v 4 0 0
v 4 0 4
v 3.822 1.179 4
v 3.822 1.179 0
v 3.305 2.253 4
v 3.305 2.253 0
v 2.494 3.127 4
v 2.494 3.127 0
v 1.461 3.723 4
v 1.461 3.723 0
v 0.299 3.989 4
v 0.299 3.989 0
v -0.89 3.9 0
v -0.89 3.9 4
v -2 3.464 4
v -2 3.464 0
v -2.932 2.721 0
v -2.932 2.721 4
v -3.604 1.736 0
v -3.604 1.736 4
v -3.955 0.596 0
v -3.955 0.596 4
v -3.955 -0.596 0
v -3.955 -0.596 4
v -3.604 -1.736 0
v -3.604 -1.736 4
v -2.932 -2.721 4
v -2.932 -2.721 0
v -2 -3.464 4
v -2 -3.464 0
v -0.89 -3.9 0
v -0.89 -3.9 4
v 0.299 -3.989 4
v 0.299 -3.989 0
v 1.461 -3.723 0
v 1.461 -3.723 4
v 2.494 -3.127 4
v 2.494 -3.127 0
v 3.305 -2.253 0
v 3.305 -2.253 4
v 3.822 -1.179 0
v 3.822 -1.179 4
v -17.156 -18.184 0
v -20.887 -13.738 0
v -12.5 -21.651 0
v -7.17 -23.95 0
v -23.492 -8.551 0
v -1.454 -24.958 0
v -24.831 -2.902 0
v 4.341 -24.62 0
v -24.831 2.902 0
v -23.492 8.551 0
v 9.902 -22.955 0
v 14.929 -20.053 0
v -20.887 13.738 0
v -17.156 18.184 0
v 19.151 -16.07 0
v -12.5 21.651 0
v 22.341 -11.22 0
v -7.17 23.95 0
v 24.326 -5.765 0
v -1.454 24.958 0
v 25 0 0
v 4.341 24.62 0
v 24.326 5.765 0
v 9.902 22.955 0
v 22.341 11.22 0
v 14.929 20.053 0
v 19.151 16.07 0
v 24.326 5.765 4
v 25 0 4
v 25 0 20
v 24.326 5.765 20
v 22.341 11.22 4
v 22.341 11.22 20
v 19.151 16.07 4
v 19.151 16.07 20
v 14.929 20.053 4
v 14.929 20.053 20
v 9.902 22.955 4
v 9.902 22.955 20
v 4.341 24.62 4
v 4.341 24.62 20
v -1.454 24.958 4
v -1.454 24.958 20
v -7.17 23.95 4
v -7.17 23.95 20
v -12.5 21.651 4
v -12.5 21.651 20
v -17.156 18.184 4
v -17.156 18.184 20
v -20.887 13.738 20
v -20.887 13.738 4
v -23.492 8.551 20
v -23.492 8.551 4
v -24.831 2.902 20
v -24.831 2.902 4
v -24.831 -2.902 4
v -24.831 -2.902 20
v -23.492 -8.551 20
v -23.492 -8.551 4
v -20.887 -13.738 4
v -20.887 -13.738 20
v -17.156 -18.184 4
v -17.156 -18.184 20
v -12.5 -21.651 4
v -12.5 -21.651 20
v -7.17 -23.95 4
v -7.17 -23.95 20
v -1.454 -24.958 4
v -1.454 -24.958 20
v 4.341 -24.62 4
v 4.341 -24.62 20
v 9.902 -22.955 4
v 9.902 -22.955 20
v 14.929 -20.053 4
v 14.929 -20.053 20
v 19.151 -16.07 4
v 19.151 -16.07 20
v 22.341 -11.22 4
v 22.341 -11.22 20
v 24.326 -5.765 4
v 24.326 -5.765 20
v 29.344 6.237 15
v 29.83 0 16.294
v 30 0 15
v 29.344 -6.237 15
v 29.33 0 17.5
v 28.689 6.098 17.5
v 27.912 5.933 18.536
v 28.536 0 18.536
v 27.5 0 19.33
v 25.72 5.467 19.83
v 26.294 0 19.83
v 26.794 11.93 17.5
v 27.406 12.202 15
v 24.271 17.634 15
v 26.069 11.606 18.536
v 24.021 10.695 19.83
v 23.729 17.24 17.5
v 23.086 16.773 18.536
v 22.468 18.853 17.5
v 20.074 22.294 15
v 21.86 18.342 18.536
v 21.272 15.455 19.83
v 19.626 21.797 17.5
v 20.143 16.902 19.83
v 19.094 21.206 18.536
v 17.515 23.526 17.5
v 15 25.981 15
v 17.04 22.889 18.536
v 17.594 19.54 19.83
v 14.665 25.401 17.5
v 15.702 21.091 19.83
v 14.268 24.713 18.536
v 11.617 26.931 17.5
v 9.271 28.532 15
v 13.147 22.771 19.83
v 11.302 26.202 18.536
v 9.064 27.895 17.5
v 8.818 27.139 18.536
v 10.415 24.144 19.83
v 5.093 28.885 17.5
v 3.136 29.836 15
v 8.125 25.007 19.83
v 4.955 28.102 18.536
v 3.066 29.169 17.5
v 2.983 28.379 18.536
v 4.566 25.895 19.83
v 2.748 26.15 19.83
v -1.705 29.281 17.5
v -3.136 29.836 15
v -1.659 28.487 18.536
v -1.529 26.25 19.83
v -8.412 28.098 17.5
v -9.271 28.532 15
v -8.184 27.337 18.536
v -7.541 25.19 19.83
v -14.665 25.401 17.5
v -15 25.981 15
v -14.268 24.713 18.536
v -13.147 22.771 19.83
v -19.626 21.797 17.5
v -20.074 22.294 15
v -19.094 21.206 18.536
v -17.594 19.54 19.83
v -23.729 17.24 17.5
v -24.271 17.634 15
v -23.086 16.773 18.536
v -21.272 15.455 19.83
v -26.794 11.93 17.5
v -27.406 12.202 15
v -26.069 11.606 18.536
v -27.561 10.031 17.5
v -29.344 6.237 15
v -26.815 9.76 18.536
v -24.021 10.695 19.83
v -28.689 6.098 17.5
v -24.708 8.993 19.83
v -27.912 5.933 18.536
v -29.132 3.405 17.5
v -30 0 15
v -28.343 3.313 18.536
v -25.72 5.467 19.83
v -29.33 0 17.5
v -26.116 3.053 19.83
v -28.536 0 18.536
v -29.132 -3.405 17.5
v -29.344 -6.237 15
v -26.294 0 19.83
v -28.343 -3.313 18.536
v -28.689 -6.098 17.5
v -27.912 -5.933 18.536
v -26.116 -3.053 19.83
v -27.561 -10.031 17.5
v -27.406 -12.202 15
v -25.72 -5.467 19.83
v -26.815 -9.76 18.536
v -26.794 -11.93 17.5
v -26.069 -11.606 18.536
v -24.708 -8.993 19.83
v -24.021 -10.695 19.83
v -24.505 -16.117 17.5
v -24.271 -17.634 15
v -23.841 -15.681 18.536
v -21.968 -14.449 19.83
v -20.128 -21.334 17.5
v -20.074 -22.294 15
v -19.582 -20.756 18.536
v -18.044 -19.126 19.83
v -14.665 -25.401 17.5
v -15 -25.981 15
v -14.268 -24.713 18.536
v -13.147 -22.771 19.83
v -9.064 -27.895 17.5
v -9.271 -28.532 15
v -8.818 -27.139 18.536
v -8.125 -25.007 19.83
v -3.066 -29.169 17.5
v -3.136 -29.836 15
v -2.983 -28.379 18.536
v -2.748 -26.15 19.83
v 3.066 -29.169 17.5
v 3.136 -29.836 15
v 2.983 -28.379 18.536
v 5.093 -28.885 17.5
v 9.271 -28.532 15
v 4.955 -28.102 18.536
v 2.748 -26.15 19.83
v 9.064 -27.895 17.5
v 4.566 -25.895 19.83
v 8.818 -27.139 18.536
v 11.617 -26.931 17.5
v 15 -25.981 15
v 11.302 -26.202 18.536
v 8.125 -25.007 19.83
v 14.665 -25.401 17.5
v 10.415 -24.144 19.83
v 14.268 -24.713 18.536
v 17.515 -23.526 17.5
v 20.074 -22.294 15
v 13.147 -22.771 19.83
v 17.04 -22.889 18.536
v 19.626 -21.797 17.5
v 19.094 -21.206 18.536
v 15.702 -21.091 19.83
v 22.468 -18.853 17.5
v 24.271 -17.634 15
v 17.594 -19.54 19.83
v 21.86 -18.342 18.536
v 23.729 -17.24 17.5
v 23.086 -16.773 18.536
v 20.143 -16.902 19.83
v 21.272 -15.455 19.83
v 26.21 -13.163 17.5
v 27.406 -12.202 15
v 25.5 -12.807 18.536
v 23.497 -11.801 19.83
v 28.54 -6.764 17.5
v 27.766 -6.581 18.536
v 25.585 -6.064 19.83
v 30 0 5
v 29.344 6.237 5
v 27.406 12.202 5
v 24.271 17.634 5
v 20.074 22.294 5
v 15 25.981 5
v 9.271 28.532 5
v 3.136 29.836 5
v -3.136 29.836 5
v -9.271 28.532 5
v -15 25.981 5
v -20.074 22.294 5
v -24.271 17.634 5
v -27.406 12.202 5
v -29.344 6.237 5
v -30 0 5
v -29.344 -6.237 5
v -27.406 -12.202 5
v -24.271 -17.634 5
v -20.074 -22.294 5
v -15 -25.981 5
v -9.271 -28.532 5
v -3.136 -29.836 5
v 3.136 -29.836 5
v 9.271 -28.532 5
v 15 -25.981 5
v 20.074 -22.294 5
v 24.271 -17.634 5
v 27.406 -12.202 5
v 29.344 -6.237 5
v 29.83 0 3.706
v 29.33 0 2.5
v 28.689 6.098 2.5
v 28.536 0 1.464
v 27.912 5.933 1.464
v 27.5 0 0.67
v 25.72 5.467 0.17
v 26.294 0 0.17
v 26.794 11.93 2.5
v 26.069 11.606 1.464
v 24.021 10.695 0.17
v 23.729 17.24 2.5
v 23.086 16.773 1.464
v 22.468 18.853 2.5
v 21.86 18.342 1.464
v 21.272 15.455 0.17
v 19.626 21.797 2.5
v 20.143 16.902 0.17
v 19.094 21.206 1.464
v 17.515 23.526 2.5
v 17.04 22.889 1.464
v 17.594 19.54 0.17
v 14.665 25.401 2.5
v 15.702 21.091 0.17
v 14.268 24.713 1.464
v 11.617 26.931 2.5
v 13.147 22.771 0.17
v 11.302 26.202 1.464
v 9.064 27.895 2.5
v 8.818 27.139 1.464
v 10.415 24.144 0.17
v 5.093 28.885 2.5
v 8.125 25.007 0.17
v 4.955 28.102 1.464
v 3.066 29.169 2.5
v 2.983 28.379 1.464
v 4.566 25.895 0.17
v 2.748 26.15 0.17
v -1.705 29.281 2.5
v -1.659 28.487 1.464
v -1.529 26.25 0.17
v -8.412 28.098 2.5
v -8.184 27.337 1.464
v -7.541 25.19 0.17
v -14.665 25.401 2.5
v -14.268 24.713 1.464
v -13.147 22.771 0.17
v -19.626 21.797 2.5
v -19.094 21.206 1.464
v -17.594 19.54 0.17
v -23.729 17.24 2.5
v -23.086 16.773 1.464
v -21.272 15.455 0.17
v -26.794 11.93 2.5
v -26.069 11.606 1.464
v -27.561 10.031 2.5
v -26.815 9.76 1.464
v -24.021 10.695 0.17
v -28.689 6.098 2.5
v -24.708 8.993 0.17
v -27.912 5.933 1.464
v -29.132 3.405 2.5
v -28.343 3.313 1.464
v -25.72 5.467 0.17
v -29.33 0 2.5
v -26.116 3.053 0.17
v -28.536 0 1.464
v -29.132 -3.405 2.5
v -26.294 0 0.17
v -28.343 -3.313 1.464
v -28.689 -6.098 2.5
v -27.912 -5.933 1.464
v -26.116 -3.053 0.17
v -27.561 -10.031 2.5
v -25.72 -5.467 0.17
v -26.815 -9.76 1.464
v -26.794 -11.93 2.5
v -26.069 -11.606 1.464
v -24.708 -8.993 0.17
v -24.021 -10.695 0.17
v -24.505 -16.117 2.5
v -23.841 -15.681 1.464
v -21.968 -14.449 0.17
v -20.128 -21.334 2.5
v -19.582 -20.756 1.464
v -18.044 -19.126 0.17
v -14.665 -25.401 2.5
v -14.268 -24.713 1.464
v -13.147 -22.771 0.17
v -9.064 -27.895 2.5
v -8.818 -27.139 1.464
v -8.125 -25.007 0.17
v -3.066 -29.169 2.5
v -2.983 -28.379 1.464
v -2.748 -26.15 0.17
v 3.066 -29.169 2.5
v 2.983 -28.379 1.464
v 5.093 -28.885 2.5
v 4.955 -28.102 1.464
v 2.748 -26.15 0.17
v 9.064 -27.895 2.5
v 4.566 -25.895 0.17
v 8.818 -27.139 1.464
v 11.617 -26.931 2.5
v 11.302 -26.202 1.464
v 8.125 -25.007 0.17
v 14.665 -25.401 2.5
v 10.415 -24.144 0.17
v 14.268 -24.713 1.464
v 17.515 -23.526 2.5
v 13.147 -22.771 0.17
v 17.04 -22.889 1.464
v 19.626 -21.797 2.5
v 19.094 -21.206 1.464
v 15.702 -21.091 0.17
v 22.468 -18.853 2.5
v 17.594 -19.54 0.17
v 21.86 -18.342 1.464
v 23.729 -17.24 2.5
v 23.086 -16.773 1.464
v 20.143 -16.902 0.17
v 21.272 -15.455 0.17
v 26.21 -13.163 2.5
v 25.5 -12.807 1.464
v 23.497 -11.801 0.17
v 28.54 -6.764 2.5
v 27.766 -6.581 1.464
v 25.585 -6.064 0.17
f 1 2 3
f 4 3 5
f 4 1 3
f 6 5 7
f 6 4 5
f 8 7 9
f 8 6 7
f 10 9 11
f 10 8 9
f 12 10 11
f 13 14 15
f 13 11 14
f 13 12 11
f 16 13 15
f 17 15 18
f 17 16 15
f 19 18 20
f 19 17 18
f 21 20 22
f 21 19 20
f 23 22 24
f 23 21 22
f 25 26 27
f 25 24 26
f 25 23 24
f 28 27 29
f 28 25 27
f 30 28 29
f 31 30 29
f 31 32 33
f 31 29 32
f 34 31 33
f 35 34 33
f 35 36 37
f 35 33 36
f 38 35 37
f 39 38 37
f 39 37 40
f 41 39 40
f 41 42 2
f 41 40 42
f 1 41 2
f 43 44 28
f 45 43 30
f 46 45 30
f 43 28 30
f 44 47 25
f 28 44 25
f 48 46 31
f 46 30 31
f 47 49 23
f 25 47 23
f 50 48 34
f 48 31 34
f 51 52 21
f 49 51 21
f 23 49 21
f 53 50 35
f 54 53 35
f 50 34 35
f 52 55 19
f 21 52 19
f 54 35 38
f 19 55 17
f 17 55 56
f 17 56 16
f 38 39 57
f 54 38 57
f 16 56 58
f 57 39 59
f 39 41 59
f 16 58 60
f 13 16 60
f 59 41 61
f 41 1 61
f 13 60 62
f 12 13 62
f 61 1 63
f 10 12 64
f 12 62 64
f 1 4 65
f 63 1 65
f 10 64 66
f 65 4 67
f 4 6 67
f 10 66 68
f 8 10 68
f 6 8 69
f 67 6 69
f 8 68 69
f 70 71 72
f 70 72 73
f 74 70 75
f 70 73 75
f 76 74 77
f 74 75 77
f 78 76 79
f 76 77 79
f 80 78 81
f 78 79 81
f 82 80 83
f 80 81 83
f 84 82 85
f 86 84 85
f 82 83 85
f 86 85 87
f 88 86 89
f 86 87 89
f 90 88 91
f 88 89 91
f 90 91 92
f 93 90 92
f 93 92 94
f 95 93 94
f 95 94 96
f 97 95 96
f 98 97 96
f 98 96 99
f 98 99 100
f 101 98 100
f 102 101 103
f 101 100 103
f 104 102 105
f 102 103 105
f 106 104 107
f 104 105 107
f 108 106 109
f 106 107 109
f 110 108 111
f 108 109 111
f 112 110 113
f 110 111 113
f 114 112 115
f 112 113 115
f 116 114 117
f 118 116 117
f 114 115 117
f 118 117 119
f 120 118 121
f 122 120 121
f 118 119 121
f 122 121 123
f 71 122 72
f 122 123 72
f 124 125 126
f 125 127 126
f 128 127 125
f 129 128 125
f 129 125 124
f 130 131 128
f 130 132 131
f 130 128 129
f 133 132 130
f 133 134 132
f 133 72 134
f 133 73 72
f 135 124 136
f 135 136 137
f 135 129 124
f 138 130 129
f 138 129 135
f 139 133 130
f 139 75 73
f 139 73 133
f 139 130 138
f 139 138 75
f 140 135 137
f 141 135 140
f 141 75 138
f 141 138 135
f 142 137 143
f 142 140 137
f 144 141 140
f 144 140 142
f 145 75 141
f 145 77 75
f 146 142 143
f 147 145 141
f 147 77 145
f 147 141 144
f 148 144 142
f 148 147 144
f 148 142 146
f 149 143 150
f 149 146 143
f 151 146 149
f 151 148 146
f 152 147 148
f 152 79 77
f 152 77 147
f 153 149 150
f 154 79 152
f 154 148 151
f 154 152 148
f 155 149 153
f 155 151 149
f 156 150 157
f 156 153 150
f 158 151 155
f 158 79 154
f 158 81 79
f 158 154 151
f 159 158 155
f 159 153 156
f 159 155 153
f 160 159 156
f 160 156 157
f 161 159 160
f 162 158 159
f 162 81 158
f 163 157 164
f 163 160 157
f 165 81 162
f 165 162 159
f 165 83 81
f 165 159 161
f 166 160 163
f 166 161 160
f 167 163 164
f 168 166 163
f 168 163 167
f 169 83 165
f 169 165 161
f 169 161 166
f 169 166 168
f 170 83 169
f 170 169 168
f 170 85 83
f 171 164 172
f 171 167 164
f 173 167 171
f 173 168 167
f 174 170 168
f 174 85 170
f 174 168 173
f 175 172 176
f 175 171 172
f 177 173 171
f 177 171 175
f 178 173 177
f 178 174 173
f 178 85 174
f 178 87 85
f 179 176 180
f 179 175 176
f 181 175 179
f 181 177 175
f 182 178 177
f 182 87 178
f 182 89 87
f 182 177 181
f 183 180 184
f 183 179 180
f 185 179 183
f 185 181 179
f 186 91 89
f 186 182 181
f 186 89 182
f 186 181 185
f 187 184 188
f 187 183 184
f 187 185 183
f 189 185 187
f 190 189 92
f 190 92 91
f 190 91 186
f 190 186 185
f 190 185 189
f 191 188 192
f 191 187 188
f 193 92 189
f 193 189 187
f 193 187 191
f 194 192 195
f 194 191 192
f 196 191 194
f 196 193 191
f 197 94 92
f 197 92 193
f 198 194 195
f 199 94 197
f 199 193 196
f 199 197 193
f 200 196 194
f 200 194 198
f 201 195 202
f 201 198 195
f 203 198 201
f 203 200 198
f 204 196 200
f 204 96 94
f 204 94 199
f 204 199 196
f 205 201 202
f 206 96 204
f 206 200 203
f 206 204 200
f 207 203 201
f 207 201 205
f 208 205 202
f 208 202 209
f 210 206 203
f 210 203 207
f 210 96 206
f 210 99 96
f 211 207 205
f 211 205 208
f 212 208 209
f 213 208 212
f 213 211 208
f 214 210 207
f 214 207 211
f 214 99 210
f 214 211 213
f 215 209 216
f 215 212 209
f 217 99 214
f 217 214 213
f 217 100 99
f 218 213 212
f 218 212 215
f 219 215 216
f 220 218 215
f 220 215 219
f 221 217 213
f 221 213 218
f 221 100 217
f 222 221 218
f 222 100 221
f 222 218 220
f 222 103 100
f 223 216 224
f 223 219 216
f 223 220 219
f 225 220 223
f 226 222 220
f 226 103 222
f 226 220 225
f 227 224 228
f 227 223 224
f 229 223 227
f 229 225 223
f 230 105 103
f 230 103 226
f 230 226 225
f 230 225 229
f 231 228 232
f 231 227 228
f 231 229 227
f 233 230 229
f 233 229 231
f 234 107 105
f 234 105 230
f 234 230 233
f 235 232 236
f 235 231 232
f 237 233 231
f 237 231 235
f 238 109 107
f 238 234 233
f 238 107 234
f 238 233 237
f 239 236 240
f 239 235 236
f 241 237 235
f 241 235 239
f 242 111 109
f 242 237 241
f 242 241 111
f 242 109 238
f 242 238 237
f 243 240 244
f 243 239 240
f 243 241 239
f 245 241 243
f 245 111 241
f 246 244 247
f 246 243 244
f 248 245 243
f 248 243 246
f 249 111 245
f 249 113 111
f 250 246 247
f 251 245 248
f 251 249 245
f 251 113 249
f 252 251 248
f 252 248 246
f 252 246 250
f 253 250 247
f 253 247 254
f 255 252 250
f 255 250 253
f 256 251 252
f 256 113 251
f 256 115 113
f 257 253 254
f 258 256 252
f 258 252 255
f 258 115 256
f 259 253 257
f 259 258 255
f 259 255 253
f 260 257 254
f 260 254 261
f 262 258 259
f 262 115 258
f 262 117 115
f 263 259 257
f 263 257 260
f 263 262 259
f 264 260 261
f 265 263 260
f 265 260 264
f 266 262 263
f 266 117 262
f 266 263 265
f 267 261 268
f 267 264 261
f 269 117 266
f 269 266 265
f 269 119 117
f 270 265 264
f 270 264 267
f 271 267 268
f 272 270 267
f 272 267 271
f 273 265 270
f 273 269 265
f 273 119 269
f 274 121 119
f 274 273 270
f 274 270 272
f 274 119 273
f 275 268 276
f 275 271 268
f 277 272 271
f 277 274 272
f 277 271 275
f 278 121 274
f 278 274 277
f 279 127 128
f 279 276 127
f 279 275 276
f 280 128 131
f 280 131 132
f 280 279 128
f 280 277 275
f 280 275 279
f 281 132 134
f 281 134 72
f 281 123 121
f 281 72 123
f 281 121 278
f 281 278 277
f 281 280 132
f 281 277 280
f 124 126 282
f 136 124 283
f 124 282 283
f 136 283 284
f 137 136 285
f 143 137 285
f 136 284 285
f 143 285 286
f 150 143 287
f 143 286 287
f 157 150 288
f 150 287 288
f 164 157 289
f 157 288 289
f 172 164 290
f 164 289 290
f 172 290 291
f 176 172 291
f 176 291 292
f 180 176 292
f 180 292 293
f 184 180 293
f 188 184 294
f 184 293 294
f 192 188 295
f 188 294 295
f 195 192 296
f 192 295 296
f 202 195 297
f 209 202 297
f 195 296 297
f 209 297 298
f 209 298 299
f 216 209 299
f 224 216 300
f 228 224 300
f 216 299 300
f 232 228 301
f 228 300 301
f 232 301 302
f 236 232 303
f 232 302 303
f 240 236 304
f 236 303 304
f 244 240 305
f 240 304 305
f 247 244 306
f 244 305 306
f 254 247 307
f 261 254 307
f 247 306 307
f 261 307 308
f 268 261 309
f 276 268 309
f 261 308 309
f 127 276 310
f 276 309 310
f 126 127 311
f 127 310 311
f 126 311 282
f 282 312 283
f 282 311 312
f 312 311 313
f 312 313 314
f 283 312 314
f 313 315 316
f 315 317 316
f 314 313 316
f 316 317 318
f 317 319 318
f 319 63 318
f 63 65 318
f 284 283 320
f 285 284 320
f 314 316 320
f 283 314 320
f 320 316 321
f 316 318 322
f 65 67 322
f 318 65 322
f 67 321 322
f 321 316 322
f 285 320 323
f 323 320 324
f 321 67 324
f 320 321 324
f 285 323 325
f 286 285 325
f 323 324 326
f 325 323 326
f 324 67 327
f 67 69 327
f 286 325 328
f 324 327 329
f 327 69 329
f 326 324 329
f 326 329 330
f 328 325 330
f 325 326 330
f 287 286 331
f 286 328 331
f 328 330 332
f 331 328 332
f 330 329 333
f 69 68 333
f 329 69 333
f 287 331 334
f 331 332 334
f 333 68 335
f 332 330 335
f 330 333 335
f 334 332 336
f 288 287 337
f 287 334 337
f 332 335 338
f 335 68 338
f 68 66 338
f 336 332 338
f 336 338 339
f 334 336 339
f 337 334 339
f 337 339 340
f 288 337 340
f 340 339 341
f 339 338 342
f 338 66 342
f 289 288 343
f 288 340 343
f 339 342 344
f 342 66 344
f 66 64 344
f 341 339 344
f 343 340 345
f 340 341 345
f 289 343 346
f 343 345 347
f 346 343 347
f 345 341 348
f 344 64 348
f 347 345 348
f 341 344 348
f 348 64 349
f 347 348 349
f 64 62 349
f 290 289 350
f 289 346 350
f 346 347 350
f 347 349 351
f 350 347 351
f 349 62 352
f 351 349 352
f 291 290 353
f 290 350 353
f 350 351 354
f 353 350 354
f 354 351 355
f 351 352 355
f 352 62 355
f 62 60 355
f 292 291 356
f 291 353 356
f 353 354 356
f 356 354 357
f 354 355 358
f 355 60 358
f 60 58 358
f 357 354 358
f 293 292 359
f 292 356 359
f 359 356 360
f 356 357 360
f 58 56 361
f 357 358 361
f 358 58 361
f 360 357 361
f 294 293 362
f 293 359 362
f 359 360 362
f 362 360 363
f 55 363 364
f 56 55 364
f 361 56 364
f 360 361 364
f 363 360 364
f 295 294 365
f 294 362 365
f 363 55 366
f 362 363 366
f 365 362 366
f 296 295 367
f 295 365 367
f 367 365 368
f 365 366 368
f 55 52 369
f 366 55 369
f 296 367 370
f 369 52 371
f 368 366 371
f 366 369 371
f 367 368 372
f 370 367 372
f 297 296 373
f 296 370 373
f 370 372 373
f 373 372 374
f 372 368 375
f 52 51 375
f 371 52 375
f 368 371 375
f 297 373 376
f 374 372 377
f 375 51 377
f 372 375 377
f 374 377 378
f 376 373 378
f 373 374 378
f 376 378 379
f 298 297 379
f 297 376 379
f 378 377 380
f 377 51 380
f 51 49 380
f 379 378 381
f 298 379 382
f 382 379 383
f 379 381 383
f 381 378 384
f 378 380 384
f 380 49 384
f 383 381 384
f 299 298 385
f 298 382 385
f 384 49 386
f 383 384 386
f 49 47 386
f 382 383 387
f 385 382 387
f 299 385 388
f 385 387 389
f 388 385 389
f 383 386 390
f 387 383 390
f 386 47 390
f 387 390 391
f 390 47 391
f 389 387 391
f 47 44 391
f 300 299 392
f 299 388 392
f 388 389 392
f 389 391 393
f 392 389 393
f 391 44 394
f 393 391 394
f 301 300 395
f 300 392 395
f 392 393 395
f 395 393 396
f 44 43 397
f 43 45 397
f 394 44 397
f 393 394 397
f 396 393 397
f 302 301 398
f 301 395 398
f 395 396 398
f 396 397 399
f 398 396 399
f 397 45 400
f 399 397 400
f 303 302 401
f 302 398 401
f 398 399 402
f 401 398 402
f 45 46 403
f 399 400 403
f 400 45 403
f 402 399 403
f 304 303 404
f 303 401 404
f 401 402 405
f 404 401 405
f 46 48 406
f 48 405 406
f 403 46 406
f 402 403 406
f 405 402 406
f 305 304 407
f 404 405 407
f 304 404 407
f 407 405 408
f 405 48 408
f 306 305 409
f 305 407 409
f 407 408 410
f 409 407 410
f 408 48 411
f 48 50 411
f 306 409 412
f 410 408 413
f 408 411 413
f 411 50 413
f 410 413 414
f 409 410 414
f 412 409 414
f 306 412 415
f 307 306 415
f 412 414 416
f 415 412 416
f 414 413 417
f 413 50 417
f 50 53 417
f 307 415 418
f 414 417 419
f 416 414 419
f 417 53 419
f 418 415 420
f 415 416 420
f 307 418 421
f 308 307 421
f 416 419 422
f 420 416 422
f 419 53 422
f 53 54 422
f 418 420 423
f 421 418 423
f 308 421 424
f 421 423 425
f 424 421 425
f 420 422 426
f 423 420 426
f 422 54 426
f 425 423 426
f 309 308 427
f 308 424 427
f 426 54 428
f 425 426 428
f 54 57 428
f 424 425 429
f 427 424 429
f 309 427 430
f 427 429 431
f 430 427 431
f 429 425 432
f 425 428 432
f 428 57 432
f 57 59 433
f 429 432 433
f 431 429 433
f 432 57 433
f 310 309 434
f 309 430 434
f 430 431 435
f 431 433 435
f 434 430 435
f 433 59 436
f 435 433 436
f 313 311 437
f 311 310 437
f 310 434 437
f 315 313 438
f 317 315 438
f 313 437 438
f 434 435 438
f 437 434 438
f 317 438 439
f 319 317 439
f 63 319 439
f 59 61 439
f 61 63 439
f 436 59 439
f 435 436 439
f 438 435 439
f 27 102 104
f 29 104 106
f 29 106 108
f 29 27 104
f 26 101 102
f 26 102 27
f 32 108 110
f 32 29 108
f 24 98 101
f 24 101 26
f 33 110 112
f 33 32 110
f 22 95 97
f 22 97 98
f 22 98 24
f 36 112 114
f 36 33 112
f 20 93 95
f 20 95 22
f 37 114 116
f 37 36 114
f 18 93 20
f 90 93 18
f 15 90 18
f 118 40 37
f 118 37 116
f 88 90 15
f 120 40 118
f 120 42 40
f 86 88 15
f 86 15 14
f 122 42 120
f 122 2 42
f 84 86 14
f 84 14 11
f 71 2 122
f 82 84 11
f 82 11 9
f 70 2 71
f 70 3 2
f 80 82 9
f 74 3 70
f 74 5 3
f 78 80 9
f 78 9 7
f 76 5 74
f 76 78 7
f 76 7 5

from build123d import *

# Parameters (mm, degrees)
SKETCH_1_R          = 30
SKETCH_1_R_2        = 4
EXTRUDE_1_DEPTH     = 20
SKETCH_2_R          = 25
CUT_EXTRUDE_1_DEPTH = 16
FILLET_1_R          = 5


with BuildPart() as part:
    # 草图1 → 凸台-拉伸1 (new body)
    with BuildSketch(Plane.XY):
        Circle(SKETCH_1_R)
        Circle(SKETCH_1_R_2, mode=Mode.SUBTRACT)
    extrude(amount=EXTRUDE_1_DEPTH)

    # 草图2 → 切除-拉伸1 (cut)
    with BuildSketch(Plane.XY.offset(20)):
        Circle(SKETCH_2_R)
    extrude(amount=-CUT_EXTRUDE_1_DEPTH, mode=Mode.SUBTRACT)

    # 圆角1
    fillet_1_edges = [part.edges().sort_by_distance(p)[0] for p in [
        (-30, 0, 0),
        (-30, 0, 20),
    ]]
    fillet(fillet_1_edges, radius=FILLET_1_R - 0.0001)  # a hair under: the kernel refuses the full size


solid = part.part
